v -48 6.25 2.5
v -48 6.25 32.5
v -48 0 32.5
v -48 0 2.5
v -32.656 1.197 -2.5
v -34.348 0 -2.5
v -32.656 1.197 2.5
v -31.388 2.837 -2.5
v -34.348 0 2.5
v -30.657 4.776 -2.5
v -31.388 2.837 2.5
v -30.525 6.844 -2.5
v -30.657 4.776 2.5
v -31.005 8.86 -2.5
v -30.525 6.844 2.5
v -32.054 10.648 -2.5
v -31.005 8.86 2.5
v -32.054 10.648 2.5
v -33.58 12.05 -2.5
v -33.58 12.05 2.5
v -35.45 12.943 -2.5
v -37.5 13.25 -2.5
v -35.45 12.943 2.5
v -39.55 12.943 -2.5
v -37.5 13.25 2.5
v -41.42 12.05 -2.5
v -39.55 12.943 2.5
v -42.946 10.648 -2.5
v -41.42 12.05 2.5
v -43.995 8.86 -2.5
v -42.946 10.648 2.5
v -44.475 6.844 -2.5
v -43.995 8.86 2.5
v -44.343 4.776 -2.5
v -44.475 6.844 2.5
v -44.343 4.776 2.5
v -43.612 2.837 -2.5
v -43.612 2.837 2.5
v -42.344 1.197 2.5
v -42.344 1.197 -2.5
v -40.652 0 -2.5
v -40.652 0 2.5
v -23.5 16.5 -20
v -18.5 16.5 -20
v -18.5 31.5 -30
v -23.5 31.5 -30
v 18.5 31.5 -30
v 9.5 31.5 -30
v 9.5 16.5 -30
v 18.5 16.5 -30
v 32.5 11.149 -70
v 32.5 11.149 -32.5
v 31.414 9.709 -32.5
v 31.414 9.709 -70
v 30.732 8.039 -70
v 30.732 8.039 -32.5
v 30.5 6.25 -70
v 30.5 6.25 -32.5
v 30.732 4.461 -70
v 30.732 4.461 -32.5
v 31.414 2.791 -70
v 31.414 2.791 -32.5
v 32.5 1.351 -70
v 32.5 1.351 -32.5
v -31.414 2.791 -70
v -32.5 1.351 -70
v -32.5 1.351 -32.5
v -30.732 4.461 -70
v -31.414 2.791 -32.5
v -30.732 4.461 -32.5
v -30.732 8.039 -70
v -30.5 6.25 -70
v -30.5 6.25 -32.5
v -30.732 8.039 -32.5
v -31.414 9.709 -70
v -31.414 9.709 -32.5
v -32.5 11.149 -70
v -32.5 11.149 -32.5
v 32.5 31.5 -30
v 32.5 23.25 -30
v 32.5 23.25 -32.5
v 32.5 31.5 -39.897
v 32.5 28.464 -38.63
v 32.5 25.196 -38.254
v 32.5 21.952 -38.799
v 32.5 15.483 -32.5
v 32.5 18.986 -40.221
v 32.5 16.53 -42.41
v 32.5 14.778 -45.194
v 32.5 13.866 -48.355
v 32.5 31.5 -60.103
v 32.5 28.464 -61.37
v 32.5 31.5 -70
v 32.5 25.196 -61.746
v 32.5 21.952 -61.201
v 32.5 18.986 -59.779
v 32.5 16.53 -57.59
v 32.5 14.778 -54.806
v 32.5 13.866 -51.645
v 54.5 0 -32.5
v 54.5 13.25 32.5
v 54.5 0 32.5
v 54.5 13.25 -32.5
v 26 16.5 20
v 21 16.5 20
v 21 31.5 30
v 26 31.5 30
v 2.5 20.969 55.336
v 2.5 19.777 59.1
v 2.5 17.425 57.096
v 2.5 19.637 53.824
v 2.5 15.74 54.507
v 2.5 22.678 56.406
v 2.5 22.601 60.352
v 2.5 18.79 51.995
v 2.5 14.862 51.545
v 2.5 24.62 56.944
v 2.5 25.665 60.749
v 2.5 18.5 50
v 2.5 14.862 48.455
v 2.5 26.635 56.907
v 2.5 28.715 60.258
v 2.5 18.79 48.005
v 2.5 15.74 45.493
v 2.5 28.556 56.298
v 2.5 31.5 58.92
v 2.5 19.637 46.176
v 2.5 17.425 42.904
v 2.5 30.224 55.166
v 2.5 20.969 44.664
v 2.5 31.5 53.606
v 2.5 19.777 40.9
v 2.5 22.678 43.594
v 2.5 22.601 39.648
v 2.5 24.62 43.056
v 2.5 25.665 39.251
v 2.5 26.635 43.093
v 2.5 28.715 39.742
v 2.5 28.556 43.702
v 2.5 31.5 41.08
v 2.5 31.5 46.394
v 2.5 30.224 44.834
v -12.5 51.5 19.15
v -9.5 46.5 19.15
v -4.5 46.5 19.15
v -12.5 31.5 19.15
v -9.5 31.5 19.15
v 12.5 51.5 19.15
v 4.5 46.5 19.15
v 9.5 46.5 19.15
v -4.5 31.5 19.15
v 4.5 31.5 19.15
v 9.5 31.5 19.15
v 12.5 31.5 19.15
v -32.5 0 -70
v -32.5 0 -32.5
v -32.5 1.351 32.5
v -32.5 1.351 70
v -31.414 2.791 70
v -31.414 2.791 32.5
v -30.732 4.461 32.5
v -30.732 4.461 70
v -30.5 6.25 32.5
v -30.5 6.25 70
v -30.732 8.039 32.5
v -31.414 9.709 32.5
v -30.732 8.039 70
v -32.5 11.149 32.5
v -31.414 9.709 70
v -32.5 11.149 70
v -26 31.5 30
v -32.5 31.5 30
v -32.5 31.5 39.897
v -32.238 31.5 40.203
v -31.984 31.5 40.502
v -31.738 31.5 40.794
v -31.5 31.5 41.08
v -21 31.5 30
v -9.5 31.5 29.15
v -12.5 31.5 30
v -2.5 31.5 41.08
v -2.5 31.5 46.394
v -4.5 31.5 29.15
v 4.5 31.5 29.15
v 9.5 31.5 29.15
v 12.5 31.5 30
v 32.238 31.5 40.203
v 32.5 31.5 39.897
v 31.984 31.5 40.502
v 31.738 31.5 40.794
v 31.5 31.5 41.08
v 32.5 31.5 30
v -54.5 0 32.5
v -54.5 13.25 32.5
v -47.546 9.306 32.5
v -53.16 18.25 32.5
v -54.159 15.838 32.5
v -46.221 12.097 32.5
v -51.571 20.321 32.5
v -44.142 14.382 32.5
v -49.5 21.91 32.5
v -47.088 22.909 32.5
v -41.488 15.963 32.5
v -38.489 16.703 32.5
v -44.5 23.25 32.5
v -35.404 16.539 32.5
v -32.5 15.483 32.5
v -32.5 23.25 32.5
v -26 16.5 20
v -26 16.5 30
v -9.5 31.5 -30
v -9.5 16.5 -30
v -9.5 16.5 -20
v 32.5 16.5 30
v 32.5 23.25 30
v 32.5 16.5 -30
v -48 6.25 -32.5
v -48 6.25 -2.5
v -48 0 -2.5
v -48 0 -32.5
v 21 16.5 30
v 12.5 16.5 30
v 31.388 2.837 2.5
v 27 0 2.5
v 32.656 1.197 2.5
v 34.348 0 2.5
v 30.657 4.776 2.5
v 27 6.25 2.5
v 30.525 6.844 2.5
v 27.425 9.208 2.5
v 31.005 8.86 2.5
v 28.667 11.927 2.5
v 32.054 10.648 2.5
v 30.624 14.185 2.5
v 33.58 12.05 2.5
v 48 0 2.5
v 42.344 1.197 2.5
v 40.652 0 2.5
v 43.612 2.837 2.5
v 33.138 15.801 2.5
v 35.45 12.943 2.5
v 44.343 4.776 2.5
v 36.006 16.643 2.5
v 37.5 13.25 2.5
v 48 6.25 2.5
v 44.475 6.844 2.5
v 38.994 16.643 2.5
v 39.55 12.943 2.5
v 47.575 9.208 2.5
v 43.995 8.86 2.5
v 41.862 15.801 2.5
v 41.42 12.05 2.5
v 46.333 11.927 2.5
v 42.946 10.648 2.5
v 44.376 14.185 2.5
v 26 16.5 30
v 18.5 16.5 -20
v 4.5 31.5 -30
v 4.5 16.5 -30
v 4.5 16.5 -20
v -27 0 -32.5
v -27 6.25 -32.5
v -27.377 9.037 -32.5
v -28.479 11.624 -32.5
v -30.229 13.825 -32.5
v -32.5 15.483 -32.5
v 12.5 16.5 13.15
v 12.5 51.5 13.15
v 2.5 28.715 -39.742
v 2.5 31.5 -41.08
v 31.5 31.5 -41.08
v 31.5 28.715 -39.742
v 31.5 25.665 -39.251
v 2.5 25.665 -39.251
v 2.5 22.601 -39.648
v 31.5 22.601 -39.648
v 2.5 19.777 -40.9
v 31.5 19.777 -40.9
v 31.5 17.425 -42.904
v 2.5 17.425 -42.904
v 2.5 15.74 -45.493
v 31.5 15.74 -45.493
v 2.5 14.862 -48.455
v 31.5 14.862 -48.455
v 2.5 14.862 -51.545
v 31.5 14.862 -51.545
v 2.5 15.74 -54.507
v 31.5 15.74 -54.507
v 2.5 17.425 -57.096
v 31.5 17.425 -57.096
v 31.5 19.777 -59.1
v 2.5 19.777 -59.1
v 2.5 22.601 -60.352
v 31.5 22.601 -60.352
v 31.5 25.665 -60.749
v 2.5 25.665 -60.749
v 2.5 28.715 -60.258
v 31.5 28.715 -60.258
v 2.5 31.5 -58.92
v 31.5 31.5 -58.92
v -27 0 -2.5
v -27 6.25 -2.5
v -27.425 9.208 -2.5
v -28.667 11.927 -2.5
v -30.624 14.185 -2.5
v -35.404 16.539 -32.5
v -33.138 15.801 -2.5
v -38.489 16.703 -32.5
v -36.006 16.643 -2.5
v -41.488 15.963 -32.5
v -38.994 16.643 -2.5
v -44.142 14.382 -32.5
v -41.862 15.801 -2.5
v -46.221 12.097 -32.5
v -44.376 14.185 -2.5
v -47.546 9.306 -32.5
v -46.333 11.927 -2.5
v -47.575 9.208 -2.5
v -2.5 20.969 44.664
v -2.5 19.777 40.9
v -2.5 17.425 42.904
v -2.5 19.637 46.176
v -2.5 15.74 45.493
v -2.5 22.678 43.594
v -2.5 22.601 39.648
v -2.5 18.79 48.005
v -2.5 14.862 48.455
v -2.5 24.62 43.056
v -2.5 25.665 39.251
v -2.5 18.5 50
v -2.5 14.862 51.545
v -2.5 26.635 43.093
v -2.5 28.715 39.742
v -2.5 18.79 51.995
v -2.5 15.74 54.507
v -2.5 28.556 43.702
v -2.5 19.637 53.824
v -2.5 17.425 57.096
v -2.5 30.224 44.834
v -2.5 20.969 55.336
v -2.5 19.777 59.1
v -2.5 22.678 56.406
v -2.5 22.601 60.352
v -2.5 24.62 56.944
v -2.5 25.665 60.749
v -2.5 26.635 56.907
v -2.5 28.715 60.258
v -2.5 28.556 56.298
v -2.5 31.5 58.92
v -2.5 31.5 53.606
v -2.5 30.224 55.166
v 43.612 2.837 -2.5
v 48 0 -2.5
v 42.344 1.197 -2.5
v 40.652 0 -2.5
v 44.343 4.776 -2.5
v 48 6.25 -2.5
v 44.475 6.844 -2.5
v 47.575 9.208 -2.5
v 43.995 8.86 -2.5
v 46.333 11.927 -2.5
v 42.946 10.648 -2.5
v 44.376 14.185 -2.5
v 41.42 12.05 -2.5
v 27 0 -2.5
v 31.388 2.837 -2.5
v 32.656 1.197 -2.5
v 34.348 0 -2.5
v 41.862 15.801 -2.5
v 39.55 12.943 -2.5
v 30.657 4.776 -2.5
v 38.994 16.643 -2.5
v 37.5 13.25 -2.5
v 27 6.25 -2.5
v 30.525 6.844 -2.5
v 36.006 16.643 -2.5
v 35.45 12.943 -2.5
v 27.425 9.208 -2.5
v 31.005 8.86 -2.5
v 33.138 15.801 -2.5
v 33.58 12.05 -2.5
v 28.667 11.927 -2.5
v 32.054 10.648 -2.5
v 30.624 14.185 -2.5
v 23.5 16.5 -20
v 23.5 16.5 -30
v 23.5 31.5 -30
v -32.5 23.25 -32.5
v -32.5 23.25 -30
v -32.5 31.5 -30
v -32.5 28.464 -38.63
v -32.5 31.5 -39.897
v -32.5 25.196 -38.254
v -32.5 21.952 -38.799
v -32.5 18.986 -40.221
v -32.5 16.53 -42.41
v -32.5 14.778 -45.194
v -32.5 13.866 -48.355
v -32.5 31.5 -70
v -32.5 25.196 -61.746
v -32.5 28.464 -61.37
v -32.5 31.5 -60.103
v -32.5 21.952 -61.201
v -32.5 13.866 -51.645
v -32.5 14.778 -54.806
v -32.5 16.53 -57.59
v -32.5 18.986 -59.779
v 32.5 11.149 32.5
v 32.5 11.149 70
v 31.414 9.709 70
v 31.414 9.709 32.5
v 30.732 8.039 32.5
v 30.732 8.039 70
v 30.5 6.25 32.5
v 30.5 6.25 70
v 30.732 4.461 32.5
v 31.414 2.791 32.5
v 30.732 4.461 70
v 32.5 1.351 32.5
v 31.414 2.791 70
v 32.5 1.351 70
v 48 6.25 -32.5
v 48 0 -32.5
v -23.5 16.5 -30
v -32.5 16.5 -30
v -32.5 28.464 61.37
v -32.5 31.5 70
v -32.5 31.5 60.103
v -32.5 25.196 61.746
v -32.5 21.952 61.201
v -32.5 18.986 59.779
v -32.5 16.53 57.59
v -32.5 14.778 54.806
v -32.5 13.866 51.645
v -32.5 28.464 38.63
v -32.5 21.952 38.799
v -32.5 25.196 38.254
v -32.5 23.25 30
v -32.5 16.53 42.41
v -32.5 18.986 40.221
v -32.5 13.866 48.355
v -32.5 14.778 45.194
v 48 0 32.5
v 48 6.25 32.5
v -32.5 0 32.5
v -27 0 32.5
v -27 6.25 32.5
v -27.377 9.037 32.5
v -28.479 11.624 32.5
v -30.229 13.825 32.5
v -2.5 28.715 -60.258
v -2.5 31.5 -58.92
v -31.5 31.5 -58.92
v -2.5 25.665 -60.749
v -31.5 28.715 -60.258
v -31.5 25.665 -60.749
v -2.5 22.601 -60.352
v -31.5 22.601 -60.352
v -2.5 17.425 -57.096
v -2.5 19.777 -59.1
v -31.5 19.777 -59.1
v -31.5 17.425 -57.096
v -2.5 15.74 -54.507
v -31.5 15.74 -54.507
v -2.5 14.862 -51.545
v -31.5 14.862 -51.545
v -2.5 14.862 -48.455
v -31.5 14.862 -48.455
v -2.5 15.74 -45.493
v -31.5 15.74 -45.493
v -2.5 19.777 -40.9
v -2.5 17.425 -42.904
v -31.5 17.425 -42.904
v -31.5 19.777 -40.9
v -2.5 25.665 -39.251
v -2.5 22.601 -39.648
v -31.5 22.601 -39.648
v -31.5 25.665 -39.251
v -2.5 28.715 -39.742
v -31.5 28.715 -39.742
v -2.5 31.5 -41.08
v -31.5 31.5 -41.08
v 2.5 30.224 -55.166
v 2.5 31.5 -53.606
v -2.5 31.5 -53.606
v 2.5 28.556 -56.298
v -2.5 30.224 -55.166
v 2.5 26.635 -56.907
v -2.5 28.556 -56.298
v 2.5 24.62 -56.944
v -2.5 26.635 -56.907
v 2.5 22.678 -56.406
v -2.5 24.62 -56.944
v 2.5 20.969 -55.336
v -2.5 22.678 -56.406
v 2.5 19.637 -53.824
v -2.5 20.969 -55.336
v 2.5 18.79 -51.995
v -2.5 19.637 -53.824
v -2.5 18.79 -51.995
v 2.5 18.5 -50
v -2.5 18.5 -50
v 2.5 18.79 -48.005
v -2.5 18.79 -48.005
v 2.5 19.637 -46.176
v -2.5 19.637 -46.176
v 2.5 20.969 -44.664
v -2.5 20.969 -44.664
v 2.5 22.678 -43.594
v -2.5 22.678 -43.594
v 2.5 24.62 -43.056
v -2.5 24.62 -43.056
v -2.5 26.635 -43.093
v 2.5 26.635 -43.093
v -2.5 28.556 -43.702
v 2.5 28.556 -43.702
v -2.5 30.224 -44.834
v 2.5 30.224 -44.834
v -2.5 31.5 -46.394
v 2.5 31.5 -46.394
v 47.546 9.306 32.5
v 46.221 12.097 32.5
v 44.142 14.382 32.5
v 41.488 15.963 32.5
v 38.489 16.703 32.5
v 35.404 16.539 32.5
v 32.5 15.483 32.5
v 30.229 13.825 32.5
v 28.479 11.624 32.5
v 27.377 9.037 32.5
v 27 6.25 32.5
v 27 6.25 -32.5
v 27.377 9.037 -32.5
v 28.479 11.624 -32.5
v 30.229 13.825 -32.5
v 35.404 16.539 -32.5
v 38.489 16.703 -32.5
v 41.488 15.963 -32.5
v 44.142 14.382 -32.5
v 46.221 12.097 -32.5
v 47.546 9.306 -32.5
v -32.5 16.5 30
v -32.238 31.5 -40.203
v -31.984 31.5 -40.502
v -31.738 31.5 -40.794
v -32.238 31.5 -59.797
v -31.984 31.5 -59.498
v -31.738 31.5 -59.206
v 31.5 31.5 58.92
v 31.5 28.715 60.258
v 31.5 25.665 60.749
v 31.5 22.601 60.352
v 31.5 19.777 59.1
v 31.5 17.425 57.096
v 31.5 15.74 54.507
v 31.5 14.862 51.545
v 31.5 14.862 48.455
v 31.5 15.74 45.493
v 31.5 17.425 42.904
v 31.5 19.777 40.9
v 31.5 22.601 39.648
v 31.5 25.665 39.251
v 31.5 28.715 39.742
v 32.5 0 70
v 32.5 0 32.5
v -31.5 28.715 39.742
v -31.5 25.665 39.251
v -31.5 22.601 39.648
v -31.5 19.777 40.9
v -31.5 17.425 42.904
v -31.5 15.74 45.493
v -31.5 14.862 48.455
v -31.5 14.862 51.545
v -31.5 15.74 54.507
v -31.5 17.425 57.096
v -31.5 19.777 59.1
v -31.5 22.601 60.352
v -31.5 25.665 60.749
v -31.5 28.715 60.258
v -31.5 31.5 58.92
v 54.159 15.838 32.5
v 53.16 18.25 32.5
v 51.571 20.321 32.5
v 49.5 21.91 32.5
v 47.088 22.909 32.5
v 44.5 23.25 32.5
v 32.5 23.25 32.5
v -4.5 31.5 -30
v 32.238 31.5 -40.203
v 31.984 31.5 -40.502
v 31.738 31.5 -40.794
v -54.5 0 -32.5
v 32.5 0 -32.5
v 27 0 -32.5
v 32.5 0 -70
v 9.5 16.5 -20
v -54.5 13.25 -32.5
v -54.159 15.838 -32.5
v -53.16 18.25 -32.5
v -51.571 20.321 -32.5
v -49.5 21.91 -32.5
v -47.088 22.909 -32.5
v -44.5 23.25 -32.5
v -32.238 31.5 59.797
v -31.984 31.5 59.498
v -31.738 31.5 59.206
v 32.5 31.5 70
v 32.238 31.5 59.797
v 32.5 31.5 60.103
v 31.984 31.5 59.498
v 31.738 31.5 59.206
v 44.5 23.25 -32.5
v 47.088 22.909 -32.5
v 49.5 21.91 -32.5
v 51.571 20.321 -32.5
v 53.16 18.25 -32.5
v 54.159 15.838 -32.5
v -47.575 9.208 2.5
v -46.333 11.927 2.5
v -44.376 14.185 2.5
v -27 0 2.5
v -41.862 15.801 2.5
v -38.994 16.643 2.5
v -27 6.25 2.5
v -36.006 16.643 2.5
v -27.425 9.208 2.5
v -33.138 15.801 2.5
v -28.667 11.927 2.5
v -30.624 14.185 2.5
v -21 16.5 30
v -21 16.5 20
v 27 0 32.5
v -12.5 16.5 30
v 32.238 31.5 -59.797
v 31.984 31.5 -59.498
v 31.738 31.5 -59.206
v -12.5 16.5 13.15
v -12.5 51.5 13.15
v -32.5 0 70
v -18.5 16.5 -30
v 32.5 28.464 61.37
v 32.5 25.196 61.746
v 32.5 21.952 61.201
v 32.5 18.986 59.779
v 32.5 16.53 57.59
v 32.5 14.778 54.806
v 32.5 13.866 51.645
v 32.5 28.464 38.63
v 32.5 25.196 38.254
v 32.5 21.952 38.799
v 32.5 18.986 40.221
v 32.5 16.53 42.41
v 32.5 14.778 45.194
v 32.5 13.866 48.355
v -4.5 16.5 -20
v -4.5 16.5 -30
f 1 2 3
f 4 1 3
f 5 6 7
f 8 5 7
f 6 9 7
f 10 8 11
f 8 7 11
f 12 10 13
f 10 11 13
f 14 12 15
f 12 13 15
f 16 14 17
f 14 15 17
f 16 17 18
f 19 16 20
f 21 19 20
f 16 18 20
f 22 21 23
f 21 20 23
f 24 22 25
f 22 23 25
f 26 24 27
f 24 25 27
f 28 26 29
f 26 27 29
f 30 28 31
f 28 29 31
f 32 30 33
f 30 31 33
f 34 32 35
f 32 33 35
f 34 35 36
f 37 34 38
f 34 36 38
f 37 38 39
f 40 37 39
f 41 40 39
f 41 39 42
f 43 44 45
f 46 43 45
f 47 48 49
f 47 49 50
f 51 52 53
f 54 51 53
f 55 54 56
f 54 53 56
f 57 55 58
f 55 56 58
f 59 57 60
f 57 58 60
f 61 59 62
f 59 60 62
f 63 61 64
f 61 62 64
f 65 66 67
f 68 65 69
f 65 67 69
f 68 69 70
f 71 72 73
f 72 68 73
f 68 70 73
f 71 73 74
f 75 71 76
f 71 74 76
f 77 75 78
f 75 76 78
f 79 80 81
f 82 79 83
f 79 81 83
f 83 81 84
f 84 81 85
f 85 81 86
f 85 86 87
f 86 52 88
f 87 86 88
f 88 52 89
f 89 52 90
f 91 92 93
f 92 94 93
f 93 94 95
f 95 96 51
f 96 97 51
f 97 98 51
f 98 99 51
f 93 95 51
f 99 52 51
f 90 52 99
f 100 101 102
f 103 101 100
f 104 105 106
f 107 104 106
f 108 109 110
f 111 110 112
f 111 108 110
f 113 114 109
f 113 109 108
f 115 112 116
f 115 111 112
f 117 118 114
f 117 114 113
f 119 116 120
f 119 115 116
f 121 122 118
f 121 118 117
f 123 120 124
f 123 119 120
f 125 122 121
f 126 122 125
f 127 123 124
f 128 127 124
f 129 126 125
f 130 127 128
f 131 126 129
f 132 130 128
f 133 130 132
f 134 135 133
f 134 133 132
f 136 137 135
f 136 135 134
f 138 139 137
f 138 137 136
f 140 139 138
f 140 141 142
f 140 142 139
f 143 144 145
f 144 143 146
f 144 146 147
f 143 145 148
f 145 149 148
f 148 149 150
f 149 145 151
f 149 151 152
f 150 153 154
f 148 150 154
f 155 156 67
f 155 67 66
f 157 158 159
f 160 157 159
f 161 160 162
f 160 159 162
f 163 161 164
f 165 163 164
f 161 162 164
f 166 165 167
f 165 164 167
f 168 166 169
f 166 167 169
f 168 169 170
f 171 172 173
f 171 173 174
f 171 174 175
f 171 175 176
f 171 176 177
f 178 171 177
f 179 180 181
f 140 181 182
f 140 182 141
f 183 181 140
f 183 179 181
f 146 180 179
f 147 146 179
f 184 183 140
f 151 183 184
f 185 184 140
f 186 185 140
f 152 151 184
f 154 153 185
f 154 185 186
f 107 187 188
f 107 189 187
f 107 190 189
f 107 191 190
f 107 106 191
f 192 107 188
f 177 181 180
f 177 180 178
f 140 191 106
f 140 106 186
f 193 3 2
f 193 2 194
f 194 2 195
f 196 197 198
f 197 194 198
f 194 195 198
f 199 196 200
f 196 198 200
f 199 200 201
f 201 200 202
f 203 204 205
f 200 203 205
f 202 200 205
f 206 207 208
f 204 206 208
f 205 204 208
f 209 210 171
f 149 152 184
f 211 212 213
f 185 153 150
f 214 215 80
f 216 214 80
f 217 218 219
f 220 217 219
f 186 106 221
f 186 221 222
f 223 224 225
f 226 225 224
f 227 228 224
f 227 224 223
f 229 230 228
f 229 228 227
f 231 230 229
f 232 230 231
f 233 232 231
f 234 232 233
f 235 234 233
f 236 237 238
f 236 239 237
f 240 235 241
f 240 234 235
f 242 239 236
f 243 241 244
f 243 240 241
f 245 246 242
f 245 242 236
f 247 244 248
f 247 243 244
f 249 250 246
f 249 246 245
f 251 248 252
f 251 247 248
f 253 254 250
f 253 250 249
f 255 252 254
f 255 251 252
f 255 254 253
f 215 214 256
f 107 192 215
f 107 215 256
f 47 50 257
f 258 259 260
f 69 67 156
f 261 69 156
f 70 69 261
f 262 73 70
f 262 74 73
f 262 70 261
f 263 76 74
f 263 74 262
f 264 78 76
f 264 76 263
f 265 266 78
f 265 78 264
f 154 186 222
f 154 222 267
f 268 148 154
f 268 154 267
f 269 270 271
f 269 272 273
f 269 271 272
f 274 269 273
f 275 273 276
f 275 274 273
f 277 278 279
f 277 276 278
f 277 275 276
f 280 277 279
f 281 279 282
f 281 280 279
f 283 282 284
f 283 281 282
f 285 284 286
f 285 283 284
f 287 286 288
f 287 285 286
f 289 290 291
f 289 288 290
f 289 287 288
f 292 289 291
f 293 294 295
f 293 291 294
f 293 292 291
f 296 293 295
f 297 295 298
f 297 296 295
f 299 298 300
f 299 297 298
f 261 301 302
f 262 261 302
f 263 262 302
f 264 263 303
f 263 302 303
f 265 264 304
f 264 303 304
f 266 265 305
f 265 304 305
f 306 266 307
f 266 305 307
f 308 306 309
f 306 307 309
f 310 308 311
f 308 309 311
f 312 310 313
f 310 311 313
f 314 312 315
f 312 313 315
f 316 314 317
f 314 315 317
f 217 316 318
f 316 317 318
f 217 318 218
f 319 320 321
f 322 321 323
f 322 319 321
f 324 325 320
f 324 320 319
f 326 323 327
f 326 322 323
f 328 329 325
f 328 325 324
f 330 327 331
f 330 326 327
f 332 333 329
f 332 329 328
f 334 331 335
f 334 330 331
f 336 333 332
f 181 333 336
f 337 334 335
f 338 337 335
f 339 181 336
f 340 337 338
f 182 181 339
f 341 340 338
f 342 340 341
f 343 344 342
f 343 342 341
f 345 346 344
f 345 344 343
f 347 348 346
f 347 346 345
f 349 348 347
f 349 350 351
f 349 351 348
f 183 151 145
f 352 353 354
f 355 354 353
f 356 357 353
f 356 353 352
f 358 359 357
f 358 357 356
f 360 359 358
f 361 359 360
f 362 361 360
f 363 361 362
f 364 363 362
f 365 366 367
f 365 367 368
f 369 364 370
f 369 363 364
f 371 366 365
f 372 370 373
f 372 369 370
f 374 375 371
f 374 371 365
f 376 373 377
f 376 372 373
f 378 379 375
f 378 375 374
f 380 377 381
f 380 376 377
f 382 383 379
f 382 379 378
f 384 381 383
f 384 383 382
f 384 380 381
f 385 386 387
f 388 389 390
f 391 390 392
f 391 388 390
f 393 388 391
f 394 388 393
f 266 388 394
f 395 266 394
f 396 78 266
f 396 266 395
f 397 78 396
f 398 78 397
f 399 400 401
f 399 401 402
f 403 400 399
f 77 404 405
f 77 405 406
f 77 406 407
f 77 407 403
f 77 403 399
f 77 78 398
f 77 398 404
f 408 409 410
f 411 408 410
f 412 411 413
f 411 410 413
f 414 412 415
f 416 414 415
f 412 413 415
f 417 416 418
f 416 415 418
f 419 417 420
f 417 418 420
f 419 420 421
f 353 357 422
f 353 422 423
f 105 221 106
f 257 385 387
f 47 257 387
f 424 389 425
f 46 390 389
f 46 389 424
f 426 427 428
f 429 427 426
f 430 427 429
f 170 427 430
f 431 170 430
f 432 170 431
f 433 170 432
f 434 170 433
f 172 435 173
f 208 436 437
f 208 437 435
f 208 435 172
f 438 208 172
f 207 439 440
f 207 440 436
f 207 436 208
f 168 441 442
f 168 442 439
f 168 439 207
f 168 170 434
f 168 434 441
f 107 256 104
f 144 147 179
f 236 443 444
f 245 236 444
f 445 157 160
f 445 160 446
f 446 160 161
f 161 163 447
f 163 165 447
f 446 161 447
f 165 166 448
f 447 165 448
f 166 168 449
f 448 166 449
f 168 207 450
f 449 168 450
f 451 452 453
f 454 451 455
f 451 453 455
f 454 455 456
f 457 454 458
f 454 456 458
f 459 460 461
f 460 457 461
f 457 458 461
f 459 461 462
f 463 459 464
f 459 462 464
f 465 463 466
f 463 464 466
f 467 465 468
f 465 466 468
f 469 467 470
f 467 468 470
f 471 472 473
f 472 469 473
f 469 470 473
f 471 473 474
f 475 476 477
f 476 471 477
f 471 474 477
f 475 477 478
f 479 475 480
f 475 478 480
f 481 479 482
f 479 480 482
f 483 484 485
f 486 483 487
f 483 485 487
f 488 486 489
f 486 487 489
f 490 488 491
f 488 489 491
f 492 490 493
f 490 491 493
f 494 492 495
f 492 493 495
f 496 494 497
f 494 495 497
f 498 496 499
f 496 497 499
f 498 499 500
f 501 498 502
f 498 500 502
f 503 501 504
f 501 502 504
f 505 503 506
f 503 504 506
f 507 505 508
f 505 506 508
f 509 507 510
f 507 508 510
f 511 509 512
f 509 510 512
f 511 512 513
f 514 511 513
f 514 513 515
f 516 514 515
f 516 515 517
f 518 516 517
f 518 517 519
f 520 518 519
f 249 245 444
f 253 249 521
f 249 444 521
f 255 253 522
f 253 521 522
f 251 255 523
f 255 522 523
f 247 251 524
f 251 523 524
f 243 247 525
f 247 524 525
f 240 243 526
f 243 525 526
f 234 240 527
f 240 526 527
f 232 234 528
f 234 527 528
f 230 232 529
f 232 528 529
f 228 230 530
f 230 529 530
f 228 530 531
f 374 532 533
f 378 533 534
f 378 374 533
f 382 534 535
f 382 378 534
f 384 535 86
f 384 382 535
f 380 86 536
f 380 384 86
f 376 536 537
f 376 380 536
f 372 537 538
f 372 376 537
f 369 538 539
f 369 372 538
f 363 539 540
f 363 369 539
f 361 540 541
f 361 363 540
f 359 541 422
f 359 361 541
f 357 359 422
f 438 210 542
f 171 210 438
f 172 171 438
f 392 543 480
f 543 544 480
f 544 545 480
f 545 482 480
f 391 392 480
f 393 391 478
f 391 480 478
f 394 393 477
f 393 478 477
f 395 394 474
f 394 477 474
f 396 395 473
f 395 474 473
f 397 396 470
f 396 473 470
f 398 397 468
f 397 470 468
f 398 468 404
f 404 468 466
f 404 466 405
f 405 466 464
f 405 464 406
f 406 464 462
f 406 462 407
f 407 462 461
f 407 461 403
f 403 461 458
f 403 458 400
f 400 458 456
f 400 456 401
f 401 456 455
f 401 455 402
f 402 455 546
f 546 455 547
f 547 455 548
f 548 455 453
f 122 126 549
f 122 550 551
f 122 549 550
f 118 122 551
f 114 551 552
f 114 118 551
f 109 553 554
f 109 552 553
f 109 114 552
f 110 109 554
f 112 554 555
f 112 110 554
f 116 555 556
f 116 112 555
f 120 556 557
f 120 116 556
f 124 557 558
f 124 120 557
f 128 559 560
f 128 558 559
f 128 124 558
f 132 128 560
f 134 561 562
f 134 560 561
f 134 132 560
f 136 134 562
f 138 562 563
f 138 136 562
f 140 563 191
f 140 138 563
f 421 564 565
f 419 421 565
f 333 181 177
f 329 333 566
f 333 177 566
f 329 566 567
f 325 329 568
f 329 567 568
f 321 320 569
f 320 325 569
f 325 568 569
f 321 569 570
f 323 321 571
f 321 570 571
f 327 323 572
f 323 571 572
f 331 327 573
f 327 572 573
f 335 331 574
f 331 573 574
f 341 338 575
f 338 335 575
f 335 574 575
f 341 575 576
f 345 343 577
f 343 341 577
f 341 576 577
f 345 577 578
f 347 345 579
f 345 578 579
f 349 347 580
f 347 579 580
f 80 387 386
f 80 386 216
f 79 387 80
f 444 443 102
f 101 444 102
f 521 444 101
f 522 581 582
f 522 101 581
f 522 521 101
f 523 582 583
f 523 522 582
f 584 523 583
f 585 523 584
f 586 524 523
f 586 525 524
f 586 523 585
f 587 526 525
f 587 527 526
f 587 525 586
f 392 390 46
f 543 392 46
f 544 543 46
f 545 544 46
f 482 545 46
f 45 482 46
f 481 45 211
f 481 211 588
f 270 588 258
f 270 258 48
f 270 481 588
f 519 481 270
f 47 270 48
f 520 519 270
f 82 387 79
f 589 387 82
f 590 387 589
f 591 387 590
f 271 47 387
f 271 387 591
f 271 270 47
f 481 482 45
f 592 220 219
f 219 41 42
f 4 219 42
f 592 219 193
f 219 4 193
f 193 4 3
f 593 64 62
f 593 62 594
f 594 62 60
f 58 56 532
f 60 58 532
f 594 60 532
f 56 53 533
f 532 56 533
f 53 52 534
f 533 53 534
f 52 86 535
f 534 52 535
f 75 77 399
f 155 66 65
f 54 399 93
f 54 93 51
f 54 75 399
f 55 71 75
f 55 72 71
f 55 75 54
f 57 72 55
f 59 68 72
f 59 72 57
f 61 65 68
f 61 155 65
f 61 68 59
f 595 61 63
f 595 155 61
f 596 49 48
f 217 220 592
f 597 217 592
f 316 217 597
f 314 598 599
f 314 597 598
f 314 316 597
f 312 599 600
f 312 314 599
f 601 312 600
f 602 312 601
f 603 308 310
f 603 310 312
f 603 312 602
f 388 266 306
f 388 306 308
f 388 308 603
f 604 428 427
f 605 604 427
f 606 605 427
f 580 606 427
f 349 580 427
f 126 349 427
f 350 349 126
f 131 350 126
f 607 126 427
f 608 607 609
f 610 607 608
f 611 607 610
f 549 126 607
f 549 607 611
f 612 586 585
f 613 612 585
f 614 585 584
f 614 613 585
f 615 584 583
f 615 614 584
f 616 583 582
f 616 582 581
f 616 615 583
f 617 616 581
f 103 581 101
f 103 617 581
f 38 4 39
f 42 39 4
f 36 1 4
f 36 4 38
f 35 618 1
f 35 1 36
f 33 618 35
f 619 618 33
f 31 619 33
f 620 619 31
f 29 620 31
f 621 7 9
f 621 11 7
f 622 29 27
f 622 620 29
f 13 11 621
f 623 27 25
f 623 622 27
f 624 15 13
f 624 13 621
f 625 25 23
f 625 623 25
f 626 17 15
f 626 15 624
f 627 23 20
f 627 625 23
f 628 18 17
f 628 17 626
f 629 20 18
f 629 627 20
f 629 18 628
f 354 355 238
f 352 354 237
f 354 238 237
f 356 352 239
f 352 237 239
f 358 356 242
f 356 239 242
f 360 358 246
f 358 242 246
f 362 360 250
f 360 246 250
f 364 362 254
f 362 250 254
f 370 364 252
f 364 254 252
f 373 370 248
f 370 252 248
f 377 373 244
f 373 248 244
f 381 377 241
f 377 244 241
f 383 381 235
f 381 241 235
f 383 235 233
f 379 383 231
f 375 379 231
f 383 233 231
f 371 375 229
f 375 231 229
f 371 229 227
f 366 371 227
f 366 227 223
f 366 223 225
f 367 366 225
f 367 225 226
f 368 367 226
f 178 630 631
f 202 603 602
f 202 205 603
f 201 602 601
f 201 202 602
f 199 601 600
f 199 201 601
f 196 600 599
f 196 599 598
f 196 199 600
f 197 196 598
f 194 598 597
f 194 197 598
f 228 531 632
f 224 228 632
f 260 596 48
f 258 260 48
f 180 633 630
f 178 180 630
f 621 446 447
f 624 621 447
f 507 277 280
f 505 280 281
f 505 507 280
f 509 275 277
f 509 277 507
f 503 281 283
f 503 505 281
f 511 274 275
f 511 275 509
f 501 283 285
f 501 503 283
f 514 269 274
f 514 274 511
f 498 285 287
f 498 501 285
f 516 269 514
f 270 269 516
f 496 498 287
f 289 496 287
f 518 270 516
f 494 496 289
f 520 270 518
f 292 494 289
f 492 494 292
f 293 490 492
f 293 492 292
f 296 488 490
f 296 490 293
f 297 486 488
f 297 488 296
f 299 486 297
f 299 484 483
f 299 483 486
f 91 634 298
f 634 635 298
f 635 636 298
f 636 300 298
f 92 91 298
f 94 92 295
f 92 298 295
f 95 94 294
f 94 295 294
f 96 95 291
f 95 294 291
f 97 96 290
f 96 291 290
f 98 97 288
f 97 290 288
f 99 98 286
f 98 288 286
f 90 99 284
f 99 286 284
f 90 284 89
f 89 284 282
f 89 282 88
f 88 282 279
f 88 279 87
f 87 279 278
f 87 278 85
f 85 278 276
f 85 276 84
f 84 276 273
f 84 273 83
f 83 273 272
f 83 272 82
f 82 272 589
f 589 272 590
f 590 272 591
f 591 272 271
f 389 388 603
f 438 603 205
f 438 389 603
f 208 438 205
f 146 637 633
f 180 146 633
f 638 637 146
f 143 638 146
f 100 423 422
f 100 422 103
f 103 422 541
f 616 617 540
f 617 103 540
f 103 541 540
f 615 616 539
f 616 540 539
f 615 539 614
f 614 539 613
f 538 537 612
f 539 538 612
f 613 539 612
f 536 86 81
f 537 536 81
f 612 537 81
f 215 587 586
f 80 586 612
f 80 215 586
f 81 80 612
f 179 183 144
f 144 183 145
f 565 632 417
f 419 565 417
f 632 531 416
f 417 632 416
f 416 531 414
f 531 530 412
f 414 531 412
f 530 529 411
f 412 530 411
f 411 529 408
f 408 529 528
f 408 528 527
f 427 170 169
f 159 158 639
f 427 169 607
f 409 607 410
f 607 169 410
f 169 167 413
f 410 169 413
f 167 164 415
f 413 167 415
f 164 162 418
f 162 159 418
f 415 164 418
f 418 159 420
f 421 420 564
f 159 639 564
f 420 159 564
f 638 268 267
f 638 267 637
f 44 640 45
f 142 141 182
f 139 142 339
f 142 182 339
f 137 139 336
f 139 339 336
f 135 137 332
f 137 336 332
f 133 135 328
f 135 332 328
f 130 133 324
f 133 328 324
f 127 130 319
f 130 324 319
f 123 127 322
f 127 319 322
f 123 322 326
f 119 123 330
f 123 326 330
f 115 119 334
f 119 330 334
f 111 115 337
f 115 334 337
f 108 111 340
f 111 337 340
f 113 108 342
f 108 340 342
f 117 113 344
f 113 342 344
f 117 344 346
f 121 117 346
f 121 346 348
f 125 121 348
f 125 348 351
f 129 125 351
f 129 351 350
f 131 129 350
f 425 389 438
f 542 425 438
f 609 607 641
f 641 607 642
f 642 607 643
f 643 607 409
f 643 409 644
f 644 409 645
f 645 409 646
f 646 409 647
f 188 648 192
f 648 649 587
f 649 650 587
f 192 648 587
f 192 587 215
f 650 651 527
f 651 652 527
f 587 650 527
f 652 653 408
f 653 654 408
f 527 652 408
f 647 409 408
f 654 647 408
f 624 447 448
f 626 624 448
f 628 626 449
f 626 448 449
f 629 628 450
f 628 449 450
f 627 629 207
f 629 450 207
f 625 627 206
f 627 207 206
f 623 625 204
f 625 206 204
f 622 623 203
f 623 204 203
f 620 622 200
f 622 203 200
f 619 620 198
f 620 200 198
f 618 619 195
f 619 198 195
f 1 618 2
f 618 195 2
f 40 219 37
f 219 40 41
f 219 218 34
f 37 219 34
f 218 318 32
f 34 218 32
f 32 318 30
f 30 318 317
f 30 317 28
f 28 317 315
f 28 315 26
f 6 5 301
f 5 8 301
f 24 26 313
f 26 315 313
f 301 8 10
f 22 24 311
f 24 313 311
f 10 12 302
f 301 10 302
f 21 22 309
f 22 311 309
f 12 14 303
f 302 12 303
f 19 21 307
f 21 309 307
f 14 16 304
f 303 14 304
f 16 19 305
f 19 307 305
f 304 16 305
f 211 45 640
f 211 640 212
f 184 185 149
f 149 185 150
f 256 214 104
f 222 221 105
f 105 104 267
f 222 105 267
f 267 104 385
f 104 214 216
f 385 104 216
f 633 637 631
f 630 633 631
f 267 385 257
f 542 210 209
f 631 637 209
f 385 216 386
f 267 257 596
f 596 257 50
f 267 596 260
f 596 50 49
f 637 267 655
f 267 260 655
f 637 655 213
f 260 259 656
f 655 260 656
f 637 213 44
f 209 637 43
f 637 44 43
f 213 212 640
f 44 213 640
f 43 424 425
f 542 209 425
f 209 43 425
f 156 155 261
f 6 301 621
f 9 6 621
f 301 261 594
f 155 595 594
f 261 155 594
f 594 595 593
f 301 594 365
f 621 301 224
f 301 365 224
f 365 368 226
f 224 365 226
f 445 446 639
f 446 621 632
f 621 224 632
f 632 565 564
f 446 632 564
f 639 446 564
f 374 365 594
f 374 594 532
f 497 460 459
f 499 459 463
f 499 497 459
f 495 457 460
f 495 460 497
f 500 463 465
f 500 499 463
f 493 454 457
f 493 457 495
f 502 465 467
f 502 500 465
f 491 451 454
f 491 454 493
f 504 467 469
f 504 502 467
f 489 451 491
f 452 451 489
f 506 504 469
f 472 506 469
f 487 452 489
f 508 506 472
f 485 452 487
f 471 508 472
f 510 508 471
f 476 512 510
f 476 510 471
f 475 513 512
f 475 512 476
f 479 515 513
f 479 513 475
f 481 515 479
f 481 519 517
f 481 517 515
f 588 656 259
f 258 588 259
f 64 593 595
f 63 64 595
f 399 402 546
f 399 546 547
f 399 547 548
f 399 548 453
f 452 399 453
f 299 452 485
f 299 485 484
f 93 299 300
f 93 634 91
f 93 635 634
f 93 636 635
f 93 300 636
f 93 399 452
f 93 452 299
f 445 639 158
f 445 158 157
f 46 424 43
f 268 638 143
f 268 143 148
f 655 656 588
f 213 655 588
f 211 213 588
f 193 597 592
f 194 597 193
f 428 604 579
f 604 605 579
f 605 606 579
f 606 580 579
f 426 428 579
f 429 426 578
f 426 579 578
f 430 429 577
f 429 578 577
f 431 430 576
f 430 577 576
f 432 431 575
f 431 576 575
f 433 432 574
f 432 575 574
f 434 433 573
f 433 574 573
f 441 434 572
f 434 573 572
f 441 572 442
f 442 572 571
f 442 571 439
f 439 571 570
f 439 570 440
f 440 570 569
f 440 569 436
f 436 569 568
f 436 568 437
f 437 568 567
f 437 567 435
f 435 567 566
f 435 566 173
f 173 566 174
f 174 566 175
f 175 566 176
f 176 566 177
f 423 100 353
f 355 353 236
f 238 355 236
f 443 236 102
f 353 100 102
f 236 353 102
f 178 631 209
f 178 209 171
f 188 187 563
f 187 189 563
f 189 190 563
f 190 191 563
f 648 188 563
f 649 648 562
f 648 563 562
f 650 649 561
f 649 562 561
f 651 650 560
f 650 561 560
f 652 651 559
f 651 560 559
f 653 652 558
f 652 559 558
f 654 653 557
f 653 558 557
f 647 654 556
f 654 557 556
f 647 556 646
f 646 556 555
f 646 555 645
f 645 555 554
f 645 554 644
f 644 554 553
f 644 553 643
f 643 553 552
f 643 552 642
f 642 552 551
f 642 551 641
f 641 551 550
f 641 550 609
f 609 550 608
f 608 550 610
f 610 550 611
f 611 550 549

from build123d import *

# Parameters (mm, degrees)
SKETCH_1_W           = 65
SKETCH_1_H           = 140
EXTRUDE_1_DEPTH      = 31.5
SKETCH_2_R           = 10.75
CUT_EXTRUDE_1_DEPTH  = 30
CUT_EXTRUDE_START    = -30
SKETCH_3_R           = 10.75
CUT_EXTRUDE_2_DEPTH  = 30
CHAMFER_1_SIZE       = 1
CHAMFER_2_SIZE       = 1
SKETCH_4_W           = 25
SKETCH_4_H           = 6
EXTRUDE_2_DEPTH      = 20
EXTRUDE_4_DEPTH      = 2.5
EXTRUDE_5_DEPTH      = 2.5
CUT_EXTRUDE_3_DEPTH  = 15
EXTRUDE_6_DEPTH      = 2.5
EXTRUDE_7_DEPTH      = 2.5
EXTRUDE_8_DEPTH      = 2.5
EXTRUDE_9_DEPTH      = 2.5
EXTRUDE_10_DEPTH     = 5
EXTRUDE_11_DEPTH     = 5
SKETCH_18_R          = 7
CUT_EXTRUDE_7_DEPTH  = 94.686978818
SKETCH_19_W          = 65.000437226
SKETCH_19_H          = 23.25
EXTRUDE_12_DEPTH     = 22
SKETCH_20_W          = 65.000437226
SKETCH_20_H          = 23.25
EXTRUDE_13_DEPTH     = 22
CUT_EXTRUDE_8_DEPTH  = 30
SKETCH_22_R          = 7
CUT_EXTRUDE_9_DEPTH  = 159.815931191
CUT_EXTRUDE_10_DEPTH = 30
FILLET_7_R           = 10


with BuildPart() as part:
    # 草图1 → 凸台-拉伸1 (new body)
    with BuildSketch(Plane(origin=(0, 0, 0), x_dir=(1, 0, 0), z_dir=(0, 1, 0))):
        Rectangle(SKETCH_1_W, SKETCH_1_H)
    extrude(amount=EXTRUDE_1_DEPTH)

    # 草图2 → 切除-拉伸1 (cut)
    with BuildSketch(Plane.ZY.offset(32.5)):
        with Locations((-50, 25.5)):
            Circle(SKETCH_2_R)
        with Locations((50, 25.5)):
            Circle(SKETCH_2_R)
    extrude(amount=-CUT_EXTRUDE_1_DEPTH, mode=Mode.SUBTRACT)

    # 草图3 → 切除-拉伸2 (cut)
    with BuildSketch(Plane(origin=(32.5, 0, 0), x_dir=(0, 0, -1), z_dir=(1, 0, 0)).offset(CUT_EXTRUDE_START)):
        with Locations((-50, 25.5)):
            Circle(SKETCH_3_R)
        with Locations((50, 25.5)):
            Circle(SKETCH_3_R)
    extrude(amount=CUT_EXTRUDE_2_DEPTH, mode=Mode.SUBTRACT)

    # 倒角1
    chamfer_1_edges = [part.edges().sort_by_distance(p)[0] for p in [
        (32.5, 14.75, 50),
    ]]
    chamfer(chamfer_1_edges, length=CHAMFER_1_SIZE)

    # 倒角2
    chamfer_2_edges = [part.edges().sort_by_distance(p)[0] for p in [
        (-32.5, 14.75, -50),
        (-32.5, 14.75, 50),
        (32.5, 14.75, -50),
    ]]
    chamfer(chamfer_2_edges, length=CHAMFER_2_SIZE)

    # 草图4 → 凸台-拉伸2 (add)
    with BuildSketch(Plane(origin=(0, 31.5, 0), x_dir=(1, 0, 0), z_dir=(0, 1, 0))):
        with Locations((0, -16.15)):
            Rectangle(SKETCH_4_W, SKETCH_4_H)
    extrude(amount=EXTRUDE_2_DEPTH)

    # 草图7 → 凸台-拉伸4 (add, symmetric)
    with BuildSketch(Plane(origin=(7, 0, 0), x_dir=(0, 0, -1), z_dir=(1, 0, 0))):
        Polygon((-19.15, 46.5), (-19.15, 31.5), (-29.15, 31.5), align=None)
    extrude(amount=EXTRUDE_4_DEPTH, both=True)

    # 草图8 → 凸台-拉伸5 (add, symmetric)
    with BuildSketch(Plane(origin=(-7, 0, 0), x_dir=(0, 0, -1), z_dir=(1, 0, 0))):
        Polygon((-19.15, 46.5), (-19.15, 31.5), (-29.15, 31.5), align=None)
    extrude(amount=EXTRUDE_5_DEPTH, both=True)

    # 草图9 → 切除-拉伸3 (cut)
    with BuildSketch(Plane(origin=(0, 31.5, 0), x_dir=(1, 0, 0), z_dir=(0, 1, 0))):
        Polygon((-32.5, 30.000218613), (32.5, 30.000218613), (32.5, -13.15), (32.5, -30.000218613), (12.5, -30.000218613), (12.5, -13.15), (-12.5, -13.15), (-12.5, -30.000218613), (-32.5, -30.000218613), (-32.5, -13.15), align=None)
    extrude(amount=-CUT_EXTRUDE_3_DEPTH, mode=Mode.SUBTRACT)

    # 草图11 → 凸台-拉伸6 (add, symmetric)
    with BuildSketch(Plane(origin=(7, 0, 0), x_dir=(0, 0, -1), z_dir=(1, 0, 0))):
        Polygon((30.000218613, 31.5), (30.000218613, 16.5), (20.000218613, 16.5), align=None)
    extrude(amount=EXTRUDE_6_DEPTH, both=True)

    # 草图13 → 凸台-拉伸7 (add, symmetric)
    with BuildSketch(Plane(origin=(21, 0, 0), x_dir=(0, 0, -1), z_dir=(1, 0, 0))):
        Polygon((30.000218613, 31.5), (30.000218613, 16.5), (20.000218613, 16.5), align=None)
    extrude(amount=EXTRUDE_7_DEPTH, both=True)

    # 草图12 → 凸台-拉伸8 (add, symmetric)
    with BuildSketch(Plane(origin=(-7, 0, 0), x_dir=(0, 0, -1), z_dir=(1, 0, 0))):
        Polygon((30.000218613, 31.5), (30.000218613, 16.5), (20.000218613, 16.5), align=None)
    extrude(amount=EXTRUDE_8_DEPTH, both=True)

    # 草图14 → 凸台-拉伸9 (add, symmetric)
    with BuildSketch(Plane(origin=(-21, 0, 0), x_dir=(0, 0, -1), z_dir=(1, 0, 0))):
        Polygon((30.000218613, 31.5), (30.000218613, 16.5), (20.000218613, 16.5), align=None)
    extrude(amount=EXTRUDE_9_DEPTH, both=True)

    # 草图15 → 凸台-拉伸10 (add)
    with BuildSketch(Plane(origin=(-21, 0, 0), x_dir=(0, 0, -1), z_dir=(1, 0, 0))):
        Polygon((-30.000218613, 31.5), (-30.000218613, 16.5), (-20.000218613, 16.5), align=None)
    extrude(amount=-EXTRUDE_10_DEPTH)

    # 草图16 → 凸台-拉伸11 (add)
    with BuildSketch(Plane(origin=(21, 0, 0), x_dir=(0, 0, -1), z_dir=(1, 0, 0))):
        Polygon((-30.000218613, 31.5), (-30.000218613, 16.5), (-20.000218613, 16.5), align=None)
    extrude(amount=EXTRUDE_11_DEPTH)

    # 草图18 → 切除-拉伸7 (cut, through all)
    with BuildSketch(Plane.ZY.offset(2.5)):
        with Locations((50, 25.5)):
            Circle(SKETCH_18_R)
        with Locations((-50, 25.5)):
            Circle(SKETCH_18_R)
    extrude(amount=-CUT_EXTRUDE_7_DEPTH, mode=Mode.SUBTRACT)

    # 草图19 → 凸台-拉伸12 (add)
    with BuildSketch(Plane(origin=(32.5, 0, 0), x_dir=(0, 0, -1), z_dir=(1, 0, 0))):
        with Locations((0, 11.625)):
            Rectangle(SKETCH_19_W, SKETCH_19_H)
    extrude(amount=EXTRUDE_12_DEPTH)

    # 草图20 → 凸台-拉伸13 (add)
    with BuildSketch(Plane.ZY.offset(32.5)):
        with Locations((0, 11.625)):
            Rectangle(SKETCH_20_W, SKETCH_20_H)
    extrude(amount=EXTRUDE_13_DEPTH)

    # 草图21 → 切除-拉伸8 (cut)
    with BuildSketch(Plane.XY.offset(32.500218613)):
        with BuildLine():
            Line((-48, 6.25), (-48, 0))
            Line((-48, 0), (-27, 0))
            Line((-27, 0), (-27, 6.25))
            ThreePointArc((-27, 6.25), (-37.5, 16.75), (-48, 6.25))
        make_face()
        with BuildLine():
            Line((27, 6.25), (27, 0))
            Line((27, 0), (48, 0))
            Line((48, 0), (48, 6.25))
            ThreePointArc((48, 6.25), (37.5, 16.75), (27, 6.25))
        make_face()
    extrude(amount=-CUT_EXTRUDE_8_DEPTH, mode=Mode.SUBTRACT)

    # 草图22 → 切除-拉伸9 (cut, through all)
    with BuildSketch(Plane.XY.offset(70)):
        with Locations((-37.5, 6.25)):
            Circle(SKETCH_22_R)
        with Locations((37.5, 6.25)):
            Circle(SKETCH_22_R)
    extrude(amount=-CUT_EXTRUDE_9_DEPTH, mode=Mode.SUBTRACT)

    # 草图23 → 切除-拉伸10 (cut)
    with BuildSketch(Plane(origin=(0, 0, -32.500218613), x_dir=(-1, 0, 0), z_dir=(0, 0, -1)).offset(CUT_EXTRUDE_START)):
        with BuildLine():
            Line((-48, 6.25), (-48, 0))
            Line((-48, 0), (-27, 0))
            Line((-27, 0), (-27, 6.25))
            ThreePointArc((-27, 6.25), (-37.5, 16.75), (-48, 6.25))
        make_face()
        with BuildLine():
            Line((48, 6.25), (48, 0))
            Line((48, 0), (27, 0))
            Line((27, 0), (27, 6.25))
            ThreePointArc((27, 6.25), (37.5, 16.75), (48, 6.25))
        make_face()
    extrude(amount=CUT_EXTRUDE_10_DEPTH, mode=Mode.SUBTRACT)

    # 圆角7
    fillet_7_edges = [part.edges().sort_by_distance(p)[0] for p in [
        (54.5, 23.25, 0),
        (-54.5, 23.25, 0),
    ]]
    fillet(fillet_7_edges, radius=FILLET_7_R)


solid = part.part
